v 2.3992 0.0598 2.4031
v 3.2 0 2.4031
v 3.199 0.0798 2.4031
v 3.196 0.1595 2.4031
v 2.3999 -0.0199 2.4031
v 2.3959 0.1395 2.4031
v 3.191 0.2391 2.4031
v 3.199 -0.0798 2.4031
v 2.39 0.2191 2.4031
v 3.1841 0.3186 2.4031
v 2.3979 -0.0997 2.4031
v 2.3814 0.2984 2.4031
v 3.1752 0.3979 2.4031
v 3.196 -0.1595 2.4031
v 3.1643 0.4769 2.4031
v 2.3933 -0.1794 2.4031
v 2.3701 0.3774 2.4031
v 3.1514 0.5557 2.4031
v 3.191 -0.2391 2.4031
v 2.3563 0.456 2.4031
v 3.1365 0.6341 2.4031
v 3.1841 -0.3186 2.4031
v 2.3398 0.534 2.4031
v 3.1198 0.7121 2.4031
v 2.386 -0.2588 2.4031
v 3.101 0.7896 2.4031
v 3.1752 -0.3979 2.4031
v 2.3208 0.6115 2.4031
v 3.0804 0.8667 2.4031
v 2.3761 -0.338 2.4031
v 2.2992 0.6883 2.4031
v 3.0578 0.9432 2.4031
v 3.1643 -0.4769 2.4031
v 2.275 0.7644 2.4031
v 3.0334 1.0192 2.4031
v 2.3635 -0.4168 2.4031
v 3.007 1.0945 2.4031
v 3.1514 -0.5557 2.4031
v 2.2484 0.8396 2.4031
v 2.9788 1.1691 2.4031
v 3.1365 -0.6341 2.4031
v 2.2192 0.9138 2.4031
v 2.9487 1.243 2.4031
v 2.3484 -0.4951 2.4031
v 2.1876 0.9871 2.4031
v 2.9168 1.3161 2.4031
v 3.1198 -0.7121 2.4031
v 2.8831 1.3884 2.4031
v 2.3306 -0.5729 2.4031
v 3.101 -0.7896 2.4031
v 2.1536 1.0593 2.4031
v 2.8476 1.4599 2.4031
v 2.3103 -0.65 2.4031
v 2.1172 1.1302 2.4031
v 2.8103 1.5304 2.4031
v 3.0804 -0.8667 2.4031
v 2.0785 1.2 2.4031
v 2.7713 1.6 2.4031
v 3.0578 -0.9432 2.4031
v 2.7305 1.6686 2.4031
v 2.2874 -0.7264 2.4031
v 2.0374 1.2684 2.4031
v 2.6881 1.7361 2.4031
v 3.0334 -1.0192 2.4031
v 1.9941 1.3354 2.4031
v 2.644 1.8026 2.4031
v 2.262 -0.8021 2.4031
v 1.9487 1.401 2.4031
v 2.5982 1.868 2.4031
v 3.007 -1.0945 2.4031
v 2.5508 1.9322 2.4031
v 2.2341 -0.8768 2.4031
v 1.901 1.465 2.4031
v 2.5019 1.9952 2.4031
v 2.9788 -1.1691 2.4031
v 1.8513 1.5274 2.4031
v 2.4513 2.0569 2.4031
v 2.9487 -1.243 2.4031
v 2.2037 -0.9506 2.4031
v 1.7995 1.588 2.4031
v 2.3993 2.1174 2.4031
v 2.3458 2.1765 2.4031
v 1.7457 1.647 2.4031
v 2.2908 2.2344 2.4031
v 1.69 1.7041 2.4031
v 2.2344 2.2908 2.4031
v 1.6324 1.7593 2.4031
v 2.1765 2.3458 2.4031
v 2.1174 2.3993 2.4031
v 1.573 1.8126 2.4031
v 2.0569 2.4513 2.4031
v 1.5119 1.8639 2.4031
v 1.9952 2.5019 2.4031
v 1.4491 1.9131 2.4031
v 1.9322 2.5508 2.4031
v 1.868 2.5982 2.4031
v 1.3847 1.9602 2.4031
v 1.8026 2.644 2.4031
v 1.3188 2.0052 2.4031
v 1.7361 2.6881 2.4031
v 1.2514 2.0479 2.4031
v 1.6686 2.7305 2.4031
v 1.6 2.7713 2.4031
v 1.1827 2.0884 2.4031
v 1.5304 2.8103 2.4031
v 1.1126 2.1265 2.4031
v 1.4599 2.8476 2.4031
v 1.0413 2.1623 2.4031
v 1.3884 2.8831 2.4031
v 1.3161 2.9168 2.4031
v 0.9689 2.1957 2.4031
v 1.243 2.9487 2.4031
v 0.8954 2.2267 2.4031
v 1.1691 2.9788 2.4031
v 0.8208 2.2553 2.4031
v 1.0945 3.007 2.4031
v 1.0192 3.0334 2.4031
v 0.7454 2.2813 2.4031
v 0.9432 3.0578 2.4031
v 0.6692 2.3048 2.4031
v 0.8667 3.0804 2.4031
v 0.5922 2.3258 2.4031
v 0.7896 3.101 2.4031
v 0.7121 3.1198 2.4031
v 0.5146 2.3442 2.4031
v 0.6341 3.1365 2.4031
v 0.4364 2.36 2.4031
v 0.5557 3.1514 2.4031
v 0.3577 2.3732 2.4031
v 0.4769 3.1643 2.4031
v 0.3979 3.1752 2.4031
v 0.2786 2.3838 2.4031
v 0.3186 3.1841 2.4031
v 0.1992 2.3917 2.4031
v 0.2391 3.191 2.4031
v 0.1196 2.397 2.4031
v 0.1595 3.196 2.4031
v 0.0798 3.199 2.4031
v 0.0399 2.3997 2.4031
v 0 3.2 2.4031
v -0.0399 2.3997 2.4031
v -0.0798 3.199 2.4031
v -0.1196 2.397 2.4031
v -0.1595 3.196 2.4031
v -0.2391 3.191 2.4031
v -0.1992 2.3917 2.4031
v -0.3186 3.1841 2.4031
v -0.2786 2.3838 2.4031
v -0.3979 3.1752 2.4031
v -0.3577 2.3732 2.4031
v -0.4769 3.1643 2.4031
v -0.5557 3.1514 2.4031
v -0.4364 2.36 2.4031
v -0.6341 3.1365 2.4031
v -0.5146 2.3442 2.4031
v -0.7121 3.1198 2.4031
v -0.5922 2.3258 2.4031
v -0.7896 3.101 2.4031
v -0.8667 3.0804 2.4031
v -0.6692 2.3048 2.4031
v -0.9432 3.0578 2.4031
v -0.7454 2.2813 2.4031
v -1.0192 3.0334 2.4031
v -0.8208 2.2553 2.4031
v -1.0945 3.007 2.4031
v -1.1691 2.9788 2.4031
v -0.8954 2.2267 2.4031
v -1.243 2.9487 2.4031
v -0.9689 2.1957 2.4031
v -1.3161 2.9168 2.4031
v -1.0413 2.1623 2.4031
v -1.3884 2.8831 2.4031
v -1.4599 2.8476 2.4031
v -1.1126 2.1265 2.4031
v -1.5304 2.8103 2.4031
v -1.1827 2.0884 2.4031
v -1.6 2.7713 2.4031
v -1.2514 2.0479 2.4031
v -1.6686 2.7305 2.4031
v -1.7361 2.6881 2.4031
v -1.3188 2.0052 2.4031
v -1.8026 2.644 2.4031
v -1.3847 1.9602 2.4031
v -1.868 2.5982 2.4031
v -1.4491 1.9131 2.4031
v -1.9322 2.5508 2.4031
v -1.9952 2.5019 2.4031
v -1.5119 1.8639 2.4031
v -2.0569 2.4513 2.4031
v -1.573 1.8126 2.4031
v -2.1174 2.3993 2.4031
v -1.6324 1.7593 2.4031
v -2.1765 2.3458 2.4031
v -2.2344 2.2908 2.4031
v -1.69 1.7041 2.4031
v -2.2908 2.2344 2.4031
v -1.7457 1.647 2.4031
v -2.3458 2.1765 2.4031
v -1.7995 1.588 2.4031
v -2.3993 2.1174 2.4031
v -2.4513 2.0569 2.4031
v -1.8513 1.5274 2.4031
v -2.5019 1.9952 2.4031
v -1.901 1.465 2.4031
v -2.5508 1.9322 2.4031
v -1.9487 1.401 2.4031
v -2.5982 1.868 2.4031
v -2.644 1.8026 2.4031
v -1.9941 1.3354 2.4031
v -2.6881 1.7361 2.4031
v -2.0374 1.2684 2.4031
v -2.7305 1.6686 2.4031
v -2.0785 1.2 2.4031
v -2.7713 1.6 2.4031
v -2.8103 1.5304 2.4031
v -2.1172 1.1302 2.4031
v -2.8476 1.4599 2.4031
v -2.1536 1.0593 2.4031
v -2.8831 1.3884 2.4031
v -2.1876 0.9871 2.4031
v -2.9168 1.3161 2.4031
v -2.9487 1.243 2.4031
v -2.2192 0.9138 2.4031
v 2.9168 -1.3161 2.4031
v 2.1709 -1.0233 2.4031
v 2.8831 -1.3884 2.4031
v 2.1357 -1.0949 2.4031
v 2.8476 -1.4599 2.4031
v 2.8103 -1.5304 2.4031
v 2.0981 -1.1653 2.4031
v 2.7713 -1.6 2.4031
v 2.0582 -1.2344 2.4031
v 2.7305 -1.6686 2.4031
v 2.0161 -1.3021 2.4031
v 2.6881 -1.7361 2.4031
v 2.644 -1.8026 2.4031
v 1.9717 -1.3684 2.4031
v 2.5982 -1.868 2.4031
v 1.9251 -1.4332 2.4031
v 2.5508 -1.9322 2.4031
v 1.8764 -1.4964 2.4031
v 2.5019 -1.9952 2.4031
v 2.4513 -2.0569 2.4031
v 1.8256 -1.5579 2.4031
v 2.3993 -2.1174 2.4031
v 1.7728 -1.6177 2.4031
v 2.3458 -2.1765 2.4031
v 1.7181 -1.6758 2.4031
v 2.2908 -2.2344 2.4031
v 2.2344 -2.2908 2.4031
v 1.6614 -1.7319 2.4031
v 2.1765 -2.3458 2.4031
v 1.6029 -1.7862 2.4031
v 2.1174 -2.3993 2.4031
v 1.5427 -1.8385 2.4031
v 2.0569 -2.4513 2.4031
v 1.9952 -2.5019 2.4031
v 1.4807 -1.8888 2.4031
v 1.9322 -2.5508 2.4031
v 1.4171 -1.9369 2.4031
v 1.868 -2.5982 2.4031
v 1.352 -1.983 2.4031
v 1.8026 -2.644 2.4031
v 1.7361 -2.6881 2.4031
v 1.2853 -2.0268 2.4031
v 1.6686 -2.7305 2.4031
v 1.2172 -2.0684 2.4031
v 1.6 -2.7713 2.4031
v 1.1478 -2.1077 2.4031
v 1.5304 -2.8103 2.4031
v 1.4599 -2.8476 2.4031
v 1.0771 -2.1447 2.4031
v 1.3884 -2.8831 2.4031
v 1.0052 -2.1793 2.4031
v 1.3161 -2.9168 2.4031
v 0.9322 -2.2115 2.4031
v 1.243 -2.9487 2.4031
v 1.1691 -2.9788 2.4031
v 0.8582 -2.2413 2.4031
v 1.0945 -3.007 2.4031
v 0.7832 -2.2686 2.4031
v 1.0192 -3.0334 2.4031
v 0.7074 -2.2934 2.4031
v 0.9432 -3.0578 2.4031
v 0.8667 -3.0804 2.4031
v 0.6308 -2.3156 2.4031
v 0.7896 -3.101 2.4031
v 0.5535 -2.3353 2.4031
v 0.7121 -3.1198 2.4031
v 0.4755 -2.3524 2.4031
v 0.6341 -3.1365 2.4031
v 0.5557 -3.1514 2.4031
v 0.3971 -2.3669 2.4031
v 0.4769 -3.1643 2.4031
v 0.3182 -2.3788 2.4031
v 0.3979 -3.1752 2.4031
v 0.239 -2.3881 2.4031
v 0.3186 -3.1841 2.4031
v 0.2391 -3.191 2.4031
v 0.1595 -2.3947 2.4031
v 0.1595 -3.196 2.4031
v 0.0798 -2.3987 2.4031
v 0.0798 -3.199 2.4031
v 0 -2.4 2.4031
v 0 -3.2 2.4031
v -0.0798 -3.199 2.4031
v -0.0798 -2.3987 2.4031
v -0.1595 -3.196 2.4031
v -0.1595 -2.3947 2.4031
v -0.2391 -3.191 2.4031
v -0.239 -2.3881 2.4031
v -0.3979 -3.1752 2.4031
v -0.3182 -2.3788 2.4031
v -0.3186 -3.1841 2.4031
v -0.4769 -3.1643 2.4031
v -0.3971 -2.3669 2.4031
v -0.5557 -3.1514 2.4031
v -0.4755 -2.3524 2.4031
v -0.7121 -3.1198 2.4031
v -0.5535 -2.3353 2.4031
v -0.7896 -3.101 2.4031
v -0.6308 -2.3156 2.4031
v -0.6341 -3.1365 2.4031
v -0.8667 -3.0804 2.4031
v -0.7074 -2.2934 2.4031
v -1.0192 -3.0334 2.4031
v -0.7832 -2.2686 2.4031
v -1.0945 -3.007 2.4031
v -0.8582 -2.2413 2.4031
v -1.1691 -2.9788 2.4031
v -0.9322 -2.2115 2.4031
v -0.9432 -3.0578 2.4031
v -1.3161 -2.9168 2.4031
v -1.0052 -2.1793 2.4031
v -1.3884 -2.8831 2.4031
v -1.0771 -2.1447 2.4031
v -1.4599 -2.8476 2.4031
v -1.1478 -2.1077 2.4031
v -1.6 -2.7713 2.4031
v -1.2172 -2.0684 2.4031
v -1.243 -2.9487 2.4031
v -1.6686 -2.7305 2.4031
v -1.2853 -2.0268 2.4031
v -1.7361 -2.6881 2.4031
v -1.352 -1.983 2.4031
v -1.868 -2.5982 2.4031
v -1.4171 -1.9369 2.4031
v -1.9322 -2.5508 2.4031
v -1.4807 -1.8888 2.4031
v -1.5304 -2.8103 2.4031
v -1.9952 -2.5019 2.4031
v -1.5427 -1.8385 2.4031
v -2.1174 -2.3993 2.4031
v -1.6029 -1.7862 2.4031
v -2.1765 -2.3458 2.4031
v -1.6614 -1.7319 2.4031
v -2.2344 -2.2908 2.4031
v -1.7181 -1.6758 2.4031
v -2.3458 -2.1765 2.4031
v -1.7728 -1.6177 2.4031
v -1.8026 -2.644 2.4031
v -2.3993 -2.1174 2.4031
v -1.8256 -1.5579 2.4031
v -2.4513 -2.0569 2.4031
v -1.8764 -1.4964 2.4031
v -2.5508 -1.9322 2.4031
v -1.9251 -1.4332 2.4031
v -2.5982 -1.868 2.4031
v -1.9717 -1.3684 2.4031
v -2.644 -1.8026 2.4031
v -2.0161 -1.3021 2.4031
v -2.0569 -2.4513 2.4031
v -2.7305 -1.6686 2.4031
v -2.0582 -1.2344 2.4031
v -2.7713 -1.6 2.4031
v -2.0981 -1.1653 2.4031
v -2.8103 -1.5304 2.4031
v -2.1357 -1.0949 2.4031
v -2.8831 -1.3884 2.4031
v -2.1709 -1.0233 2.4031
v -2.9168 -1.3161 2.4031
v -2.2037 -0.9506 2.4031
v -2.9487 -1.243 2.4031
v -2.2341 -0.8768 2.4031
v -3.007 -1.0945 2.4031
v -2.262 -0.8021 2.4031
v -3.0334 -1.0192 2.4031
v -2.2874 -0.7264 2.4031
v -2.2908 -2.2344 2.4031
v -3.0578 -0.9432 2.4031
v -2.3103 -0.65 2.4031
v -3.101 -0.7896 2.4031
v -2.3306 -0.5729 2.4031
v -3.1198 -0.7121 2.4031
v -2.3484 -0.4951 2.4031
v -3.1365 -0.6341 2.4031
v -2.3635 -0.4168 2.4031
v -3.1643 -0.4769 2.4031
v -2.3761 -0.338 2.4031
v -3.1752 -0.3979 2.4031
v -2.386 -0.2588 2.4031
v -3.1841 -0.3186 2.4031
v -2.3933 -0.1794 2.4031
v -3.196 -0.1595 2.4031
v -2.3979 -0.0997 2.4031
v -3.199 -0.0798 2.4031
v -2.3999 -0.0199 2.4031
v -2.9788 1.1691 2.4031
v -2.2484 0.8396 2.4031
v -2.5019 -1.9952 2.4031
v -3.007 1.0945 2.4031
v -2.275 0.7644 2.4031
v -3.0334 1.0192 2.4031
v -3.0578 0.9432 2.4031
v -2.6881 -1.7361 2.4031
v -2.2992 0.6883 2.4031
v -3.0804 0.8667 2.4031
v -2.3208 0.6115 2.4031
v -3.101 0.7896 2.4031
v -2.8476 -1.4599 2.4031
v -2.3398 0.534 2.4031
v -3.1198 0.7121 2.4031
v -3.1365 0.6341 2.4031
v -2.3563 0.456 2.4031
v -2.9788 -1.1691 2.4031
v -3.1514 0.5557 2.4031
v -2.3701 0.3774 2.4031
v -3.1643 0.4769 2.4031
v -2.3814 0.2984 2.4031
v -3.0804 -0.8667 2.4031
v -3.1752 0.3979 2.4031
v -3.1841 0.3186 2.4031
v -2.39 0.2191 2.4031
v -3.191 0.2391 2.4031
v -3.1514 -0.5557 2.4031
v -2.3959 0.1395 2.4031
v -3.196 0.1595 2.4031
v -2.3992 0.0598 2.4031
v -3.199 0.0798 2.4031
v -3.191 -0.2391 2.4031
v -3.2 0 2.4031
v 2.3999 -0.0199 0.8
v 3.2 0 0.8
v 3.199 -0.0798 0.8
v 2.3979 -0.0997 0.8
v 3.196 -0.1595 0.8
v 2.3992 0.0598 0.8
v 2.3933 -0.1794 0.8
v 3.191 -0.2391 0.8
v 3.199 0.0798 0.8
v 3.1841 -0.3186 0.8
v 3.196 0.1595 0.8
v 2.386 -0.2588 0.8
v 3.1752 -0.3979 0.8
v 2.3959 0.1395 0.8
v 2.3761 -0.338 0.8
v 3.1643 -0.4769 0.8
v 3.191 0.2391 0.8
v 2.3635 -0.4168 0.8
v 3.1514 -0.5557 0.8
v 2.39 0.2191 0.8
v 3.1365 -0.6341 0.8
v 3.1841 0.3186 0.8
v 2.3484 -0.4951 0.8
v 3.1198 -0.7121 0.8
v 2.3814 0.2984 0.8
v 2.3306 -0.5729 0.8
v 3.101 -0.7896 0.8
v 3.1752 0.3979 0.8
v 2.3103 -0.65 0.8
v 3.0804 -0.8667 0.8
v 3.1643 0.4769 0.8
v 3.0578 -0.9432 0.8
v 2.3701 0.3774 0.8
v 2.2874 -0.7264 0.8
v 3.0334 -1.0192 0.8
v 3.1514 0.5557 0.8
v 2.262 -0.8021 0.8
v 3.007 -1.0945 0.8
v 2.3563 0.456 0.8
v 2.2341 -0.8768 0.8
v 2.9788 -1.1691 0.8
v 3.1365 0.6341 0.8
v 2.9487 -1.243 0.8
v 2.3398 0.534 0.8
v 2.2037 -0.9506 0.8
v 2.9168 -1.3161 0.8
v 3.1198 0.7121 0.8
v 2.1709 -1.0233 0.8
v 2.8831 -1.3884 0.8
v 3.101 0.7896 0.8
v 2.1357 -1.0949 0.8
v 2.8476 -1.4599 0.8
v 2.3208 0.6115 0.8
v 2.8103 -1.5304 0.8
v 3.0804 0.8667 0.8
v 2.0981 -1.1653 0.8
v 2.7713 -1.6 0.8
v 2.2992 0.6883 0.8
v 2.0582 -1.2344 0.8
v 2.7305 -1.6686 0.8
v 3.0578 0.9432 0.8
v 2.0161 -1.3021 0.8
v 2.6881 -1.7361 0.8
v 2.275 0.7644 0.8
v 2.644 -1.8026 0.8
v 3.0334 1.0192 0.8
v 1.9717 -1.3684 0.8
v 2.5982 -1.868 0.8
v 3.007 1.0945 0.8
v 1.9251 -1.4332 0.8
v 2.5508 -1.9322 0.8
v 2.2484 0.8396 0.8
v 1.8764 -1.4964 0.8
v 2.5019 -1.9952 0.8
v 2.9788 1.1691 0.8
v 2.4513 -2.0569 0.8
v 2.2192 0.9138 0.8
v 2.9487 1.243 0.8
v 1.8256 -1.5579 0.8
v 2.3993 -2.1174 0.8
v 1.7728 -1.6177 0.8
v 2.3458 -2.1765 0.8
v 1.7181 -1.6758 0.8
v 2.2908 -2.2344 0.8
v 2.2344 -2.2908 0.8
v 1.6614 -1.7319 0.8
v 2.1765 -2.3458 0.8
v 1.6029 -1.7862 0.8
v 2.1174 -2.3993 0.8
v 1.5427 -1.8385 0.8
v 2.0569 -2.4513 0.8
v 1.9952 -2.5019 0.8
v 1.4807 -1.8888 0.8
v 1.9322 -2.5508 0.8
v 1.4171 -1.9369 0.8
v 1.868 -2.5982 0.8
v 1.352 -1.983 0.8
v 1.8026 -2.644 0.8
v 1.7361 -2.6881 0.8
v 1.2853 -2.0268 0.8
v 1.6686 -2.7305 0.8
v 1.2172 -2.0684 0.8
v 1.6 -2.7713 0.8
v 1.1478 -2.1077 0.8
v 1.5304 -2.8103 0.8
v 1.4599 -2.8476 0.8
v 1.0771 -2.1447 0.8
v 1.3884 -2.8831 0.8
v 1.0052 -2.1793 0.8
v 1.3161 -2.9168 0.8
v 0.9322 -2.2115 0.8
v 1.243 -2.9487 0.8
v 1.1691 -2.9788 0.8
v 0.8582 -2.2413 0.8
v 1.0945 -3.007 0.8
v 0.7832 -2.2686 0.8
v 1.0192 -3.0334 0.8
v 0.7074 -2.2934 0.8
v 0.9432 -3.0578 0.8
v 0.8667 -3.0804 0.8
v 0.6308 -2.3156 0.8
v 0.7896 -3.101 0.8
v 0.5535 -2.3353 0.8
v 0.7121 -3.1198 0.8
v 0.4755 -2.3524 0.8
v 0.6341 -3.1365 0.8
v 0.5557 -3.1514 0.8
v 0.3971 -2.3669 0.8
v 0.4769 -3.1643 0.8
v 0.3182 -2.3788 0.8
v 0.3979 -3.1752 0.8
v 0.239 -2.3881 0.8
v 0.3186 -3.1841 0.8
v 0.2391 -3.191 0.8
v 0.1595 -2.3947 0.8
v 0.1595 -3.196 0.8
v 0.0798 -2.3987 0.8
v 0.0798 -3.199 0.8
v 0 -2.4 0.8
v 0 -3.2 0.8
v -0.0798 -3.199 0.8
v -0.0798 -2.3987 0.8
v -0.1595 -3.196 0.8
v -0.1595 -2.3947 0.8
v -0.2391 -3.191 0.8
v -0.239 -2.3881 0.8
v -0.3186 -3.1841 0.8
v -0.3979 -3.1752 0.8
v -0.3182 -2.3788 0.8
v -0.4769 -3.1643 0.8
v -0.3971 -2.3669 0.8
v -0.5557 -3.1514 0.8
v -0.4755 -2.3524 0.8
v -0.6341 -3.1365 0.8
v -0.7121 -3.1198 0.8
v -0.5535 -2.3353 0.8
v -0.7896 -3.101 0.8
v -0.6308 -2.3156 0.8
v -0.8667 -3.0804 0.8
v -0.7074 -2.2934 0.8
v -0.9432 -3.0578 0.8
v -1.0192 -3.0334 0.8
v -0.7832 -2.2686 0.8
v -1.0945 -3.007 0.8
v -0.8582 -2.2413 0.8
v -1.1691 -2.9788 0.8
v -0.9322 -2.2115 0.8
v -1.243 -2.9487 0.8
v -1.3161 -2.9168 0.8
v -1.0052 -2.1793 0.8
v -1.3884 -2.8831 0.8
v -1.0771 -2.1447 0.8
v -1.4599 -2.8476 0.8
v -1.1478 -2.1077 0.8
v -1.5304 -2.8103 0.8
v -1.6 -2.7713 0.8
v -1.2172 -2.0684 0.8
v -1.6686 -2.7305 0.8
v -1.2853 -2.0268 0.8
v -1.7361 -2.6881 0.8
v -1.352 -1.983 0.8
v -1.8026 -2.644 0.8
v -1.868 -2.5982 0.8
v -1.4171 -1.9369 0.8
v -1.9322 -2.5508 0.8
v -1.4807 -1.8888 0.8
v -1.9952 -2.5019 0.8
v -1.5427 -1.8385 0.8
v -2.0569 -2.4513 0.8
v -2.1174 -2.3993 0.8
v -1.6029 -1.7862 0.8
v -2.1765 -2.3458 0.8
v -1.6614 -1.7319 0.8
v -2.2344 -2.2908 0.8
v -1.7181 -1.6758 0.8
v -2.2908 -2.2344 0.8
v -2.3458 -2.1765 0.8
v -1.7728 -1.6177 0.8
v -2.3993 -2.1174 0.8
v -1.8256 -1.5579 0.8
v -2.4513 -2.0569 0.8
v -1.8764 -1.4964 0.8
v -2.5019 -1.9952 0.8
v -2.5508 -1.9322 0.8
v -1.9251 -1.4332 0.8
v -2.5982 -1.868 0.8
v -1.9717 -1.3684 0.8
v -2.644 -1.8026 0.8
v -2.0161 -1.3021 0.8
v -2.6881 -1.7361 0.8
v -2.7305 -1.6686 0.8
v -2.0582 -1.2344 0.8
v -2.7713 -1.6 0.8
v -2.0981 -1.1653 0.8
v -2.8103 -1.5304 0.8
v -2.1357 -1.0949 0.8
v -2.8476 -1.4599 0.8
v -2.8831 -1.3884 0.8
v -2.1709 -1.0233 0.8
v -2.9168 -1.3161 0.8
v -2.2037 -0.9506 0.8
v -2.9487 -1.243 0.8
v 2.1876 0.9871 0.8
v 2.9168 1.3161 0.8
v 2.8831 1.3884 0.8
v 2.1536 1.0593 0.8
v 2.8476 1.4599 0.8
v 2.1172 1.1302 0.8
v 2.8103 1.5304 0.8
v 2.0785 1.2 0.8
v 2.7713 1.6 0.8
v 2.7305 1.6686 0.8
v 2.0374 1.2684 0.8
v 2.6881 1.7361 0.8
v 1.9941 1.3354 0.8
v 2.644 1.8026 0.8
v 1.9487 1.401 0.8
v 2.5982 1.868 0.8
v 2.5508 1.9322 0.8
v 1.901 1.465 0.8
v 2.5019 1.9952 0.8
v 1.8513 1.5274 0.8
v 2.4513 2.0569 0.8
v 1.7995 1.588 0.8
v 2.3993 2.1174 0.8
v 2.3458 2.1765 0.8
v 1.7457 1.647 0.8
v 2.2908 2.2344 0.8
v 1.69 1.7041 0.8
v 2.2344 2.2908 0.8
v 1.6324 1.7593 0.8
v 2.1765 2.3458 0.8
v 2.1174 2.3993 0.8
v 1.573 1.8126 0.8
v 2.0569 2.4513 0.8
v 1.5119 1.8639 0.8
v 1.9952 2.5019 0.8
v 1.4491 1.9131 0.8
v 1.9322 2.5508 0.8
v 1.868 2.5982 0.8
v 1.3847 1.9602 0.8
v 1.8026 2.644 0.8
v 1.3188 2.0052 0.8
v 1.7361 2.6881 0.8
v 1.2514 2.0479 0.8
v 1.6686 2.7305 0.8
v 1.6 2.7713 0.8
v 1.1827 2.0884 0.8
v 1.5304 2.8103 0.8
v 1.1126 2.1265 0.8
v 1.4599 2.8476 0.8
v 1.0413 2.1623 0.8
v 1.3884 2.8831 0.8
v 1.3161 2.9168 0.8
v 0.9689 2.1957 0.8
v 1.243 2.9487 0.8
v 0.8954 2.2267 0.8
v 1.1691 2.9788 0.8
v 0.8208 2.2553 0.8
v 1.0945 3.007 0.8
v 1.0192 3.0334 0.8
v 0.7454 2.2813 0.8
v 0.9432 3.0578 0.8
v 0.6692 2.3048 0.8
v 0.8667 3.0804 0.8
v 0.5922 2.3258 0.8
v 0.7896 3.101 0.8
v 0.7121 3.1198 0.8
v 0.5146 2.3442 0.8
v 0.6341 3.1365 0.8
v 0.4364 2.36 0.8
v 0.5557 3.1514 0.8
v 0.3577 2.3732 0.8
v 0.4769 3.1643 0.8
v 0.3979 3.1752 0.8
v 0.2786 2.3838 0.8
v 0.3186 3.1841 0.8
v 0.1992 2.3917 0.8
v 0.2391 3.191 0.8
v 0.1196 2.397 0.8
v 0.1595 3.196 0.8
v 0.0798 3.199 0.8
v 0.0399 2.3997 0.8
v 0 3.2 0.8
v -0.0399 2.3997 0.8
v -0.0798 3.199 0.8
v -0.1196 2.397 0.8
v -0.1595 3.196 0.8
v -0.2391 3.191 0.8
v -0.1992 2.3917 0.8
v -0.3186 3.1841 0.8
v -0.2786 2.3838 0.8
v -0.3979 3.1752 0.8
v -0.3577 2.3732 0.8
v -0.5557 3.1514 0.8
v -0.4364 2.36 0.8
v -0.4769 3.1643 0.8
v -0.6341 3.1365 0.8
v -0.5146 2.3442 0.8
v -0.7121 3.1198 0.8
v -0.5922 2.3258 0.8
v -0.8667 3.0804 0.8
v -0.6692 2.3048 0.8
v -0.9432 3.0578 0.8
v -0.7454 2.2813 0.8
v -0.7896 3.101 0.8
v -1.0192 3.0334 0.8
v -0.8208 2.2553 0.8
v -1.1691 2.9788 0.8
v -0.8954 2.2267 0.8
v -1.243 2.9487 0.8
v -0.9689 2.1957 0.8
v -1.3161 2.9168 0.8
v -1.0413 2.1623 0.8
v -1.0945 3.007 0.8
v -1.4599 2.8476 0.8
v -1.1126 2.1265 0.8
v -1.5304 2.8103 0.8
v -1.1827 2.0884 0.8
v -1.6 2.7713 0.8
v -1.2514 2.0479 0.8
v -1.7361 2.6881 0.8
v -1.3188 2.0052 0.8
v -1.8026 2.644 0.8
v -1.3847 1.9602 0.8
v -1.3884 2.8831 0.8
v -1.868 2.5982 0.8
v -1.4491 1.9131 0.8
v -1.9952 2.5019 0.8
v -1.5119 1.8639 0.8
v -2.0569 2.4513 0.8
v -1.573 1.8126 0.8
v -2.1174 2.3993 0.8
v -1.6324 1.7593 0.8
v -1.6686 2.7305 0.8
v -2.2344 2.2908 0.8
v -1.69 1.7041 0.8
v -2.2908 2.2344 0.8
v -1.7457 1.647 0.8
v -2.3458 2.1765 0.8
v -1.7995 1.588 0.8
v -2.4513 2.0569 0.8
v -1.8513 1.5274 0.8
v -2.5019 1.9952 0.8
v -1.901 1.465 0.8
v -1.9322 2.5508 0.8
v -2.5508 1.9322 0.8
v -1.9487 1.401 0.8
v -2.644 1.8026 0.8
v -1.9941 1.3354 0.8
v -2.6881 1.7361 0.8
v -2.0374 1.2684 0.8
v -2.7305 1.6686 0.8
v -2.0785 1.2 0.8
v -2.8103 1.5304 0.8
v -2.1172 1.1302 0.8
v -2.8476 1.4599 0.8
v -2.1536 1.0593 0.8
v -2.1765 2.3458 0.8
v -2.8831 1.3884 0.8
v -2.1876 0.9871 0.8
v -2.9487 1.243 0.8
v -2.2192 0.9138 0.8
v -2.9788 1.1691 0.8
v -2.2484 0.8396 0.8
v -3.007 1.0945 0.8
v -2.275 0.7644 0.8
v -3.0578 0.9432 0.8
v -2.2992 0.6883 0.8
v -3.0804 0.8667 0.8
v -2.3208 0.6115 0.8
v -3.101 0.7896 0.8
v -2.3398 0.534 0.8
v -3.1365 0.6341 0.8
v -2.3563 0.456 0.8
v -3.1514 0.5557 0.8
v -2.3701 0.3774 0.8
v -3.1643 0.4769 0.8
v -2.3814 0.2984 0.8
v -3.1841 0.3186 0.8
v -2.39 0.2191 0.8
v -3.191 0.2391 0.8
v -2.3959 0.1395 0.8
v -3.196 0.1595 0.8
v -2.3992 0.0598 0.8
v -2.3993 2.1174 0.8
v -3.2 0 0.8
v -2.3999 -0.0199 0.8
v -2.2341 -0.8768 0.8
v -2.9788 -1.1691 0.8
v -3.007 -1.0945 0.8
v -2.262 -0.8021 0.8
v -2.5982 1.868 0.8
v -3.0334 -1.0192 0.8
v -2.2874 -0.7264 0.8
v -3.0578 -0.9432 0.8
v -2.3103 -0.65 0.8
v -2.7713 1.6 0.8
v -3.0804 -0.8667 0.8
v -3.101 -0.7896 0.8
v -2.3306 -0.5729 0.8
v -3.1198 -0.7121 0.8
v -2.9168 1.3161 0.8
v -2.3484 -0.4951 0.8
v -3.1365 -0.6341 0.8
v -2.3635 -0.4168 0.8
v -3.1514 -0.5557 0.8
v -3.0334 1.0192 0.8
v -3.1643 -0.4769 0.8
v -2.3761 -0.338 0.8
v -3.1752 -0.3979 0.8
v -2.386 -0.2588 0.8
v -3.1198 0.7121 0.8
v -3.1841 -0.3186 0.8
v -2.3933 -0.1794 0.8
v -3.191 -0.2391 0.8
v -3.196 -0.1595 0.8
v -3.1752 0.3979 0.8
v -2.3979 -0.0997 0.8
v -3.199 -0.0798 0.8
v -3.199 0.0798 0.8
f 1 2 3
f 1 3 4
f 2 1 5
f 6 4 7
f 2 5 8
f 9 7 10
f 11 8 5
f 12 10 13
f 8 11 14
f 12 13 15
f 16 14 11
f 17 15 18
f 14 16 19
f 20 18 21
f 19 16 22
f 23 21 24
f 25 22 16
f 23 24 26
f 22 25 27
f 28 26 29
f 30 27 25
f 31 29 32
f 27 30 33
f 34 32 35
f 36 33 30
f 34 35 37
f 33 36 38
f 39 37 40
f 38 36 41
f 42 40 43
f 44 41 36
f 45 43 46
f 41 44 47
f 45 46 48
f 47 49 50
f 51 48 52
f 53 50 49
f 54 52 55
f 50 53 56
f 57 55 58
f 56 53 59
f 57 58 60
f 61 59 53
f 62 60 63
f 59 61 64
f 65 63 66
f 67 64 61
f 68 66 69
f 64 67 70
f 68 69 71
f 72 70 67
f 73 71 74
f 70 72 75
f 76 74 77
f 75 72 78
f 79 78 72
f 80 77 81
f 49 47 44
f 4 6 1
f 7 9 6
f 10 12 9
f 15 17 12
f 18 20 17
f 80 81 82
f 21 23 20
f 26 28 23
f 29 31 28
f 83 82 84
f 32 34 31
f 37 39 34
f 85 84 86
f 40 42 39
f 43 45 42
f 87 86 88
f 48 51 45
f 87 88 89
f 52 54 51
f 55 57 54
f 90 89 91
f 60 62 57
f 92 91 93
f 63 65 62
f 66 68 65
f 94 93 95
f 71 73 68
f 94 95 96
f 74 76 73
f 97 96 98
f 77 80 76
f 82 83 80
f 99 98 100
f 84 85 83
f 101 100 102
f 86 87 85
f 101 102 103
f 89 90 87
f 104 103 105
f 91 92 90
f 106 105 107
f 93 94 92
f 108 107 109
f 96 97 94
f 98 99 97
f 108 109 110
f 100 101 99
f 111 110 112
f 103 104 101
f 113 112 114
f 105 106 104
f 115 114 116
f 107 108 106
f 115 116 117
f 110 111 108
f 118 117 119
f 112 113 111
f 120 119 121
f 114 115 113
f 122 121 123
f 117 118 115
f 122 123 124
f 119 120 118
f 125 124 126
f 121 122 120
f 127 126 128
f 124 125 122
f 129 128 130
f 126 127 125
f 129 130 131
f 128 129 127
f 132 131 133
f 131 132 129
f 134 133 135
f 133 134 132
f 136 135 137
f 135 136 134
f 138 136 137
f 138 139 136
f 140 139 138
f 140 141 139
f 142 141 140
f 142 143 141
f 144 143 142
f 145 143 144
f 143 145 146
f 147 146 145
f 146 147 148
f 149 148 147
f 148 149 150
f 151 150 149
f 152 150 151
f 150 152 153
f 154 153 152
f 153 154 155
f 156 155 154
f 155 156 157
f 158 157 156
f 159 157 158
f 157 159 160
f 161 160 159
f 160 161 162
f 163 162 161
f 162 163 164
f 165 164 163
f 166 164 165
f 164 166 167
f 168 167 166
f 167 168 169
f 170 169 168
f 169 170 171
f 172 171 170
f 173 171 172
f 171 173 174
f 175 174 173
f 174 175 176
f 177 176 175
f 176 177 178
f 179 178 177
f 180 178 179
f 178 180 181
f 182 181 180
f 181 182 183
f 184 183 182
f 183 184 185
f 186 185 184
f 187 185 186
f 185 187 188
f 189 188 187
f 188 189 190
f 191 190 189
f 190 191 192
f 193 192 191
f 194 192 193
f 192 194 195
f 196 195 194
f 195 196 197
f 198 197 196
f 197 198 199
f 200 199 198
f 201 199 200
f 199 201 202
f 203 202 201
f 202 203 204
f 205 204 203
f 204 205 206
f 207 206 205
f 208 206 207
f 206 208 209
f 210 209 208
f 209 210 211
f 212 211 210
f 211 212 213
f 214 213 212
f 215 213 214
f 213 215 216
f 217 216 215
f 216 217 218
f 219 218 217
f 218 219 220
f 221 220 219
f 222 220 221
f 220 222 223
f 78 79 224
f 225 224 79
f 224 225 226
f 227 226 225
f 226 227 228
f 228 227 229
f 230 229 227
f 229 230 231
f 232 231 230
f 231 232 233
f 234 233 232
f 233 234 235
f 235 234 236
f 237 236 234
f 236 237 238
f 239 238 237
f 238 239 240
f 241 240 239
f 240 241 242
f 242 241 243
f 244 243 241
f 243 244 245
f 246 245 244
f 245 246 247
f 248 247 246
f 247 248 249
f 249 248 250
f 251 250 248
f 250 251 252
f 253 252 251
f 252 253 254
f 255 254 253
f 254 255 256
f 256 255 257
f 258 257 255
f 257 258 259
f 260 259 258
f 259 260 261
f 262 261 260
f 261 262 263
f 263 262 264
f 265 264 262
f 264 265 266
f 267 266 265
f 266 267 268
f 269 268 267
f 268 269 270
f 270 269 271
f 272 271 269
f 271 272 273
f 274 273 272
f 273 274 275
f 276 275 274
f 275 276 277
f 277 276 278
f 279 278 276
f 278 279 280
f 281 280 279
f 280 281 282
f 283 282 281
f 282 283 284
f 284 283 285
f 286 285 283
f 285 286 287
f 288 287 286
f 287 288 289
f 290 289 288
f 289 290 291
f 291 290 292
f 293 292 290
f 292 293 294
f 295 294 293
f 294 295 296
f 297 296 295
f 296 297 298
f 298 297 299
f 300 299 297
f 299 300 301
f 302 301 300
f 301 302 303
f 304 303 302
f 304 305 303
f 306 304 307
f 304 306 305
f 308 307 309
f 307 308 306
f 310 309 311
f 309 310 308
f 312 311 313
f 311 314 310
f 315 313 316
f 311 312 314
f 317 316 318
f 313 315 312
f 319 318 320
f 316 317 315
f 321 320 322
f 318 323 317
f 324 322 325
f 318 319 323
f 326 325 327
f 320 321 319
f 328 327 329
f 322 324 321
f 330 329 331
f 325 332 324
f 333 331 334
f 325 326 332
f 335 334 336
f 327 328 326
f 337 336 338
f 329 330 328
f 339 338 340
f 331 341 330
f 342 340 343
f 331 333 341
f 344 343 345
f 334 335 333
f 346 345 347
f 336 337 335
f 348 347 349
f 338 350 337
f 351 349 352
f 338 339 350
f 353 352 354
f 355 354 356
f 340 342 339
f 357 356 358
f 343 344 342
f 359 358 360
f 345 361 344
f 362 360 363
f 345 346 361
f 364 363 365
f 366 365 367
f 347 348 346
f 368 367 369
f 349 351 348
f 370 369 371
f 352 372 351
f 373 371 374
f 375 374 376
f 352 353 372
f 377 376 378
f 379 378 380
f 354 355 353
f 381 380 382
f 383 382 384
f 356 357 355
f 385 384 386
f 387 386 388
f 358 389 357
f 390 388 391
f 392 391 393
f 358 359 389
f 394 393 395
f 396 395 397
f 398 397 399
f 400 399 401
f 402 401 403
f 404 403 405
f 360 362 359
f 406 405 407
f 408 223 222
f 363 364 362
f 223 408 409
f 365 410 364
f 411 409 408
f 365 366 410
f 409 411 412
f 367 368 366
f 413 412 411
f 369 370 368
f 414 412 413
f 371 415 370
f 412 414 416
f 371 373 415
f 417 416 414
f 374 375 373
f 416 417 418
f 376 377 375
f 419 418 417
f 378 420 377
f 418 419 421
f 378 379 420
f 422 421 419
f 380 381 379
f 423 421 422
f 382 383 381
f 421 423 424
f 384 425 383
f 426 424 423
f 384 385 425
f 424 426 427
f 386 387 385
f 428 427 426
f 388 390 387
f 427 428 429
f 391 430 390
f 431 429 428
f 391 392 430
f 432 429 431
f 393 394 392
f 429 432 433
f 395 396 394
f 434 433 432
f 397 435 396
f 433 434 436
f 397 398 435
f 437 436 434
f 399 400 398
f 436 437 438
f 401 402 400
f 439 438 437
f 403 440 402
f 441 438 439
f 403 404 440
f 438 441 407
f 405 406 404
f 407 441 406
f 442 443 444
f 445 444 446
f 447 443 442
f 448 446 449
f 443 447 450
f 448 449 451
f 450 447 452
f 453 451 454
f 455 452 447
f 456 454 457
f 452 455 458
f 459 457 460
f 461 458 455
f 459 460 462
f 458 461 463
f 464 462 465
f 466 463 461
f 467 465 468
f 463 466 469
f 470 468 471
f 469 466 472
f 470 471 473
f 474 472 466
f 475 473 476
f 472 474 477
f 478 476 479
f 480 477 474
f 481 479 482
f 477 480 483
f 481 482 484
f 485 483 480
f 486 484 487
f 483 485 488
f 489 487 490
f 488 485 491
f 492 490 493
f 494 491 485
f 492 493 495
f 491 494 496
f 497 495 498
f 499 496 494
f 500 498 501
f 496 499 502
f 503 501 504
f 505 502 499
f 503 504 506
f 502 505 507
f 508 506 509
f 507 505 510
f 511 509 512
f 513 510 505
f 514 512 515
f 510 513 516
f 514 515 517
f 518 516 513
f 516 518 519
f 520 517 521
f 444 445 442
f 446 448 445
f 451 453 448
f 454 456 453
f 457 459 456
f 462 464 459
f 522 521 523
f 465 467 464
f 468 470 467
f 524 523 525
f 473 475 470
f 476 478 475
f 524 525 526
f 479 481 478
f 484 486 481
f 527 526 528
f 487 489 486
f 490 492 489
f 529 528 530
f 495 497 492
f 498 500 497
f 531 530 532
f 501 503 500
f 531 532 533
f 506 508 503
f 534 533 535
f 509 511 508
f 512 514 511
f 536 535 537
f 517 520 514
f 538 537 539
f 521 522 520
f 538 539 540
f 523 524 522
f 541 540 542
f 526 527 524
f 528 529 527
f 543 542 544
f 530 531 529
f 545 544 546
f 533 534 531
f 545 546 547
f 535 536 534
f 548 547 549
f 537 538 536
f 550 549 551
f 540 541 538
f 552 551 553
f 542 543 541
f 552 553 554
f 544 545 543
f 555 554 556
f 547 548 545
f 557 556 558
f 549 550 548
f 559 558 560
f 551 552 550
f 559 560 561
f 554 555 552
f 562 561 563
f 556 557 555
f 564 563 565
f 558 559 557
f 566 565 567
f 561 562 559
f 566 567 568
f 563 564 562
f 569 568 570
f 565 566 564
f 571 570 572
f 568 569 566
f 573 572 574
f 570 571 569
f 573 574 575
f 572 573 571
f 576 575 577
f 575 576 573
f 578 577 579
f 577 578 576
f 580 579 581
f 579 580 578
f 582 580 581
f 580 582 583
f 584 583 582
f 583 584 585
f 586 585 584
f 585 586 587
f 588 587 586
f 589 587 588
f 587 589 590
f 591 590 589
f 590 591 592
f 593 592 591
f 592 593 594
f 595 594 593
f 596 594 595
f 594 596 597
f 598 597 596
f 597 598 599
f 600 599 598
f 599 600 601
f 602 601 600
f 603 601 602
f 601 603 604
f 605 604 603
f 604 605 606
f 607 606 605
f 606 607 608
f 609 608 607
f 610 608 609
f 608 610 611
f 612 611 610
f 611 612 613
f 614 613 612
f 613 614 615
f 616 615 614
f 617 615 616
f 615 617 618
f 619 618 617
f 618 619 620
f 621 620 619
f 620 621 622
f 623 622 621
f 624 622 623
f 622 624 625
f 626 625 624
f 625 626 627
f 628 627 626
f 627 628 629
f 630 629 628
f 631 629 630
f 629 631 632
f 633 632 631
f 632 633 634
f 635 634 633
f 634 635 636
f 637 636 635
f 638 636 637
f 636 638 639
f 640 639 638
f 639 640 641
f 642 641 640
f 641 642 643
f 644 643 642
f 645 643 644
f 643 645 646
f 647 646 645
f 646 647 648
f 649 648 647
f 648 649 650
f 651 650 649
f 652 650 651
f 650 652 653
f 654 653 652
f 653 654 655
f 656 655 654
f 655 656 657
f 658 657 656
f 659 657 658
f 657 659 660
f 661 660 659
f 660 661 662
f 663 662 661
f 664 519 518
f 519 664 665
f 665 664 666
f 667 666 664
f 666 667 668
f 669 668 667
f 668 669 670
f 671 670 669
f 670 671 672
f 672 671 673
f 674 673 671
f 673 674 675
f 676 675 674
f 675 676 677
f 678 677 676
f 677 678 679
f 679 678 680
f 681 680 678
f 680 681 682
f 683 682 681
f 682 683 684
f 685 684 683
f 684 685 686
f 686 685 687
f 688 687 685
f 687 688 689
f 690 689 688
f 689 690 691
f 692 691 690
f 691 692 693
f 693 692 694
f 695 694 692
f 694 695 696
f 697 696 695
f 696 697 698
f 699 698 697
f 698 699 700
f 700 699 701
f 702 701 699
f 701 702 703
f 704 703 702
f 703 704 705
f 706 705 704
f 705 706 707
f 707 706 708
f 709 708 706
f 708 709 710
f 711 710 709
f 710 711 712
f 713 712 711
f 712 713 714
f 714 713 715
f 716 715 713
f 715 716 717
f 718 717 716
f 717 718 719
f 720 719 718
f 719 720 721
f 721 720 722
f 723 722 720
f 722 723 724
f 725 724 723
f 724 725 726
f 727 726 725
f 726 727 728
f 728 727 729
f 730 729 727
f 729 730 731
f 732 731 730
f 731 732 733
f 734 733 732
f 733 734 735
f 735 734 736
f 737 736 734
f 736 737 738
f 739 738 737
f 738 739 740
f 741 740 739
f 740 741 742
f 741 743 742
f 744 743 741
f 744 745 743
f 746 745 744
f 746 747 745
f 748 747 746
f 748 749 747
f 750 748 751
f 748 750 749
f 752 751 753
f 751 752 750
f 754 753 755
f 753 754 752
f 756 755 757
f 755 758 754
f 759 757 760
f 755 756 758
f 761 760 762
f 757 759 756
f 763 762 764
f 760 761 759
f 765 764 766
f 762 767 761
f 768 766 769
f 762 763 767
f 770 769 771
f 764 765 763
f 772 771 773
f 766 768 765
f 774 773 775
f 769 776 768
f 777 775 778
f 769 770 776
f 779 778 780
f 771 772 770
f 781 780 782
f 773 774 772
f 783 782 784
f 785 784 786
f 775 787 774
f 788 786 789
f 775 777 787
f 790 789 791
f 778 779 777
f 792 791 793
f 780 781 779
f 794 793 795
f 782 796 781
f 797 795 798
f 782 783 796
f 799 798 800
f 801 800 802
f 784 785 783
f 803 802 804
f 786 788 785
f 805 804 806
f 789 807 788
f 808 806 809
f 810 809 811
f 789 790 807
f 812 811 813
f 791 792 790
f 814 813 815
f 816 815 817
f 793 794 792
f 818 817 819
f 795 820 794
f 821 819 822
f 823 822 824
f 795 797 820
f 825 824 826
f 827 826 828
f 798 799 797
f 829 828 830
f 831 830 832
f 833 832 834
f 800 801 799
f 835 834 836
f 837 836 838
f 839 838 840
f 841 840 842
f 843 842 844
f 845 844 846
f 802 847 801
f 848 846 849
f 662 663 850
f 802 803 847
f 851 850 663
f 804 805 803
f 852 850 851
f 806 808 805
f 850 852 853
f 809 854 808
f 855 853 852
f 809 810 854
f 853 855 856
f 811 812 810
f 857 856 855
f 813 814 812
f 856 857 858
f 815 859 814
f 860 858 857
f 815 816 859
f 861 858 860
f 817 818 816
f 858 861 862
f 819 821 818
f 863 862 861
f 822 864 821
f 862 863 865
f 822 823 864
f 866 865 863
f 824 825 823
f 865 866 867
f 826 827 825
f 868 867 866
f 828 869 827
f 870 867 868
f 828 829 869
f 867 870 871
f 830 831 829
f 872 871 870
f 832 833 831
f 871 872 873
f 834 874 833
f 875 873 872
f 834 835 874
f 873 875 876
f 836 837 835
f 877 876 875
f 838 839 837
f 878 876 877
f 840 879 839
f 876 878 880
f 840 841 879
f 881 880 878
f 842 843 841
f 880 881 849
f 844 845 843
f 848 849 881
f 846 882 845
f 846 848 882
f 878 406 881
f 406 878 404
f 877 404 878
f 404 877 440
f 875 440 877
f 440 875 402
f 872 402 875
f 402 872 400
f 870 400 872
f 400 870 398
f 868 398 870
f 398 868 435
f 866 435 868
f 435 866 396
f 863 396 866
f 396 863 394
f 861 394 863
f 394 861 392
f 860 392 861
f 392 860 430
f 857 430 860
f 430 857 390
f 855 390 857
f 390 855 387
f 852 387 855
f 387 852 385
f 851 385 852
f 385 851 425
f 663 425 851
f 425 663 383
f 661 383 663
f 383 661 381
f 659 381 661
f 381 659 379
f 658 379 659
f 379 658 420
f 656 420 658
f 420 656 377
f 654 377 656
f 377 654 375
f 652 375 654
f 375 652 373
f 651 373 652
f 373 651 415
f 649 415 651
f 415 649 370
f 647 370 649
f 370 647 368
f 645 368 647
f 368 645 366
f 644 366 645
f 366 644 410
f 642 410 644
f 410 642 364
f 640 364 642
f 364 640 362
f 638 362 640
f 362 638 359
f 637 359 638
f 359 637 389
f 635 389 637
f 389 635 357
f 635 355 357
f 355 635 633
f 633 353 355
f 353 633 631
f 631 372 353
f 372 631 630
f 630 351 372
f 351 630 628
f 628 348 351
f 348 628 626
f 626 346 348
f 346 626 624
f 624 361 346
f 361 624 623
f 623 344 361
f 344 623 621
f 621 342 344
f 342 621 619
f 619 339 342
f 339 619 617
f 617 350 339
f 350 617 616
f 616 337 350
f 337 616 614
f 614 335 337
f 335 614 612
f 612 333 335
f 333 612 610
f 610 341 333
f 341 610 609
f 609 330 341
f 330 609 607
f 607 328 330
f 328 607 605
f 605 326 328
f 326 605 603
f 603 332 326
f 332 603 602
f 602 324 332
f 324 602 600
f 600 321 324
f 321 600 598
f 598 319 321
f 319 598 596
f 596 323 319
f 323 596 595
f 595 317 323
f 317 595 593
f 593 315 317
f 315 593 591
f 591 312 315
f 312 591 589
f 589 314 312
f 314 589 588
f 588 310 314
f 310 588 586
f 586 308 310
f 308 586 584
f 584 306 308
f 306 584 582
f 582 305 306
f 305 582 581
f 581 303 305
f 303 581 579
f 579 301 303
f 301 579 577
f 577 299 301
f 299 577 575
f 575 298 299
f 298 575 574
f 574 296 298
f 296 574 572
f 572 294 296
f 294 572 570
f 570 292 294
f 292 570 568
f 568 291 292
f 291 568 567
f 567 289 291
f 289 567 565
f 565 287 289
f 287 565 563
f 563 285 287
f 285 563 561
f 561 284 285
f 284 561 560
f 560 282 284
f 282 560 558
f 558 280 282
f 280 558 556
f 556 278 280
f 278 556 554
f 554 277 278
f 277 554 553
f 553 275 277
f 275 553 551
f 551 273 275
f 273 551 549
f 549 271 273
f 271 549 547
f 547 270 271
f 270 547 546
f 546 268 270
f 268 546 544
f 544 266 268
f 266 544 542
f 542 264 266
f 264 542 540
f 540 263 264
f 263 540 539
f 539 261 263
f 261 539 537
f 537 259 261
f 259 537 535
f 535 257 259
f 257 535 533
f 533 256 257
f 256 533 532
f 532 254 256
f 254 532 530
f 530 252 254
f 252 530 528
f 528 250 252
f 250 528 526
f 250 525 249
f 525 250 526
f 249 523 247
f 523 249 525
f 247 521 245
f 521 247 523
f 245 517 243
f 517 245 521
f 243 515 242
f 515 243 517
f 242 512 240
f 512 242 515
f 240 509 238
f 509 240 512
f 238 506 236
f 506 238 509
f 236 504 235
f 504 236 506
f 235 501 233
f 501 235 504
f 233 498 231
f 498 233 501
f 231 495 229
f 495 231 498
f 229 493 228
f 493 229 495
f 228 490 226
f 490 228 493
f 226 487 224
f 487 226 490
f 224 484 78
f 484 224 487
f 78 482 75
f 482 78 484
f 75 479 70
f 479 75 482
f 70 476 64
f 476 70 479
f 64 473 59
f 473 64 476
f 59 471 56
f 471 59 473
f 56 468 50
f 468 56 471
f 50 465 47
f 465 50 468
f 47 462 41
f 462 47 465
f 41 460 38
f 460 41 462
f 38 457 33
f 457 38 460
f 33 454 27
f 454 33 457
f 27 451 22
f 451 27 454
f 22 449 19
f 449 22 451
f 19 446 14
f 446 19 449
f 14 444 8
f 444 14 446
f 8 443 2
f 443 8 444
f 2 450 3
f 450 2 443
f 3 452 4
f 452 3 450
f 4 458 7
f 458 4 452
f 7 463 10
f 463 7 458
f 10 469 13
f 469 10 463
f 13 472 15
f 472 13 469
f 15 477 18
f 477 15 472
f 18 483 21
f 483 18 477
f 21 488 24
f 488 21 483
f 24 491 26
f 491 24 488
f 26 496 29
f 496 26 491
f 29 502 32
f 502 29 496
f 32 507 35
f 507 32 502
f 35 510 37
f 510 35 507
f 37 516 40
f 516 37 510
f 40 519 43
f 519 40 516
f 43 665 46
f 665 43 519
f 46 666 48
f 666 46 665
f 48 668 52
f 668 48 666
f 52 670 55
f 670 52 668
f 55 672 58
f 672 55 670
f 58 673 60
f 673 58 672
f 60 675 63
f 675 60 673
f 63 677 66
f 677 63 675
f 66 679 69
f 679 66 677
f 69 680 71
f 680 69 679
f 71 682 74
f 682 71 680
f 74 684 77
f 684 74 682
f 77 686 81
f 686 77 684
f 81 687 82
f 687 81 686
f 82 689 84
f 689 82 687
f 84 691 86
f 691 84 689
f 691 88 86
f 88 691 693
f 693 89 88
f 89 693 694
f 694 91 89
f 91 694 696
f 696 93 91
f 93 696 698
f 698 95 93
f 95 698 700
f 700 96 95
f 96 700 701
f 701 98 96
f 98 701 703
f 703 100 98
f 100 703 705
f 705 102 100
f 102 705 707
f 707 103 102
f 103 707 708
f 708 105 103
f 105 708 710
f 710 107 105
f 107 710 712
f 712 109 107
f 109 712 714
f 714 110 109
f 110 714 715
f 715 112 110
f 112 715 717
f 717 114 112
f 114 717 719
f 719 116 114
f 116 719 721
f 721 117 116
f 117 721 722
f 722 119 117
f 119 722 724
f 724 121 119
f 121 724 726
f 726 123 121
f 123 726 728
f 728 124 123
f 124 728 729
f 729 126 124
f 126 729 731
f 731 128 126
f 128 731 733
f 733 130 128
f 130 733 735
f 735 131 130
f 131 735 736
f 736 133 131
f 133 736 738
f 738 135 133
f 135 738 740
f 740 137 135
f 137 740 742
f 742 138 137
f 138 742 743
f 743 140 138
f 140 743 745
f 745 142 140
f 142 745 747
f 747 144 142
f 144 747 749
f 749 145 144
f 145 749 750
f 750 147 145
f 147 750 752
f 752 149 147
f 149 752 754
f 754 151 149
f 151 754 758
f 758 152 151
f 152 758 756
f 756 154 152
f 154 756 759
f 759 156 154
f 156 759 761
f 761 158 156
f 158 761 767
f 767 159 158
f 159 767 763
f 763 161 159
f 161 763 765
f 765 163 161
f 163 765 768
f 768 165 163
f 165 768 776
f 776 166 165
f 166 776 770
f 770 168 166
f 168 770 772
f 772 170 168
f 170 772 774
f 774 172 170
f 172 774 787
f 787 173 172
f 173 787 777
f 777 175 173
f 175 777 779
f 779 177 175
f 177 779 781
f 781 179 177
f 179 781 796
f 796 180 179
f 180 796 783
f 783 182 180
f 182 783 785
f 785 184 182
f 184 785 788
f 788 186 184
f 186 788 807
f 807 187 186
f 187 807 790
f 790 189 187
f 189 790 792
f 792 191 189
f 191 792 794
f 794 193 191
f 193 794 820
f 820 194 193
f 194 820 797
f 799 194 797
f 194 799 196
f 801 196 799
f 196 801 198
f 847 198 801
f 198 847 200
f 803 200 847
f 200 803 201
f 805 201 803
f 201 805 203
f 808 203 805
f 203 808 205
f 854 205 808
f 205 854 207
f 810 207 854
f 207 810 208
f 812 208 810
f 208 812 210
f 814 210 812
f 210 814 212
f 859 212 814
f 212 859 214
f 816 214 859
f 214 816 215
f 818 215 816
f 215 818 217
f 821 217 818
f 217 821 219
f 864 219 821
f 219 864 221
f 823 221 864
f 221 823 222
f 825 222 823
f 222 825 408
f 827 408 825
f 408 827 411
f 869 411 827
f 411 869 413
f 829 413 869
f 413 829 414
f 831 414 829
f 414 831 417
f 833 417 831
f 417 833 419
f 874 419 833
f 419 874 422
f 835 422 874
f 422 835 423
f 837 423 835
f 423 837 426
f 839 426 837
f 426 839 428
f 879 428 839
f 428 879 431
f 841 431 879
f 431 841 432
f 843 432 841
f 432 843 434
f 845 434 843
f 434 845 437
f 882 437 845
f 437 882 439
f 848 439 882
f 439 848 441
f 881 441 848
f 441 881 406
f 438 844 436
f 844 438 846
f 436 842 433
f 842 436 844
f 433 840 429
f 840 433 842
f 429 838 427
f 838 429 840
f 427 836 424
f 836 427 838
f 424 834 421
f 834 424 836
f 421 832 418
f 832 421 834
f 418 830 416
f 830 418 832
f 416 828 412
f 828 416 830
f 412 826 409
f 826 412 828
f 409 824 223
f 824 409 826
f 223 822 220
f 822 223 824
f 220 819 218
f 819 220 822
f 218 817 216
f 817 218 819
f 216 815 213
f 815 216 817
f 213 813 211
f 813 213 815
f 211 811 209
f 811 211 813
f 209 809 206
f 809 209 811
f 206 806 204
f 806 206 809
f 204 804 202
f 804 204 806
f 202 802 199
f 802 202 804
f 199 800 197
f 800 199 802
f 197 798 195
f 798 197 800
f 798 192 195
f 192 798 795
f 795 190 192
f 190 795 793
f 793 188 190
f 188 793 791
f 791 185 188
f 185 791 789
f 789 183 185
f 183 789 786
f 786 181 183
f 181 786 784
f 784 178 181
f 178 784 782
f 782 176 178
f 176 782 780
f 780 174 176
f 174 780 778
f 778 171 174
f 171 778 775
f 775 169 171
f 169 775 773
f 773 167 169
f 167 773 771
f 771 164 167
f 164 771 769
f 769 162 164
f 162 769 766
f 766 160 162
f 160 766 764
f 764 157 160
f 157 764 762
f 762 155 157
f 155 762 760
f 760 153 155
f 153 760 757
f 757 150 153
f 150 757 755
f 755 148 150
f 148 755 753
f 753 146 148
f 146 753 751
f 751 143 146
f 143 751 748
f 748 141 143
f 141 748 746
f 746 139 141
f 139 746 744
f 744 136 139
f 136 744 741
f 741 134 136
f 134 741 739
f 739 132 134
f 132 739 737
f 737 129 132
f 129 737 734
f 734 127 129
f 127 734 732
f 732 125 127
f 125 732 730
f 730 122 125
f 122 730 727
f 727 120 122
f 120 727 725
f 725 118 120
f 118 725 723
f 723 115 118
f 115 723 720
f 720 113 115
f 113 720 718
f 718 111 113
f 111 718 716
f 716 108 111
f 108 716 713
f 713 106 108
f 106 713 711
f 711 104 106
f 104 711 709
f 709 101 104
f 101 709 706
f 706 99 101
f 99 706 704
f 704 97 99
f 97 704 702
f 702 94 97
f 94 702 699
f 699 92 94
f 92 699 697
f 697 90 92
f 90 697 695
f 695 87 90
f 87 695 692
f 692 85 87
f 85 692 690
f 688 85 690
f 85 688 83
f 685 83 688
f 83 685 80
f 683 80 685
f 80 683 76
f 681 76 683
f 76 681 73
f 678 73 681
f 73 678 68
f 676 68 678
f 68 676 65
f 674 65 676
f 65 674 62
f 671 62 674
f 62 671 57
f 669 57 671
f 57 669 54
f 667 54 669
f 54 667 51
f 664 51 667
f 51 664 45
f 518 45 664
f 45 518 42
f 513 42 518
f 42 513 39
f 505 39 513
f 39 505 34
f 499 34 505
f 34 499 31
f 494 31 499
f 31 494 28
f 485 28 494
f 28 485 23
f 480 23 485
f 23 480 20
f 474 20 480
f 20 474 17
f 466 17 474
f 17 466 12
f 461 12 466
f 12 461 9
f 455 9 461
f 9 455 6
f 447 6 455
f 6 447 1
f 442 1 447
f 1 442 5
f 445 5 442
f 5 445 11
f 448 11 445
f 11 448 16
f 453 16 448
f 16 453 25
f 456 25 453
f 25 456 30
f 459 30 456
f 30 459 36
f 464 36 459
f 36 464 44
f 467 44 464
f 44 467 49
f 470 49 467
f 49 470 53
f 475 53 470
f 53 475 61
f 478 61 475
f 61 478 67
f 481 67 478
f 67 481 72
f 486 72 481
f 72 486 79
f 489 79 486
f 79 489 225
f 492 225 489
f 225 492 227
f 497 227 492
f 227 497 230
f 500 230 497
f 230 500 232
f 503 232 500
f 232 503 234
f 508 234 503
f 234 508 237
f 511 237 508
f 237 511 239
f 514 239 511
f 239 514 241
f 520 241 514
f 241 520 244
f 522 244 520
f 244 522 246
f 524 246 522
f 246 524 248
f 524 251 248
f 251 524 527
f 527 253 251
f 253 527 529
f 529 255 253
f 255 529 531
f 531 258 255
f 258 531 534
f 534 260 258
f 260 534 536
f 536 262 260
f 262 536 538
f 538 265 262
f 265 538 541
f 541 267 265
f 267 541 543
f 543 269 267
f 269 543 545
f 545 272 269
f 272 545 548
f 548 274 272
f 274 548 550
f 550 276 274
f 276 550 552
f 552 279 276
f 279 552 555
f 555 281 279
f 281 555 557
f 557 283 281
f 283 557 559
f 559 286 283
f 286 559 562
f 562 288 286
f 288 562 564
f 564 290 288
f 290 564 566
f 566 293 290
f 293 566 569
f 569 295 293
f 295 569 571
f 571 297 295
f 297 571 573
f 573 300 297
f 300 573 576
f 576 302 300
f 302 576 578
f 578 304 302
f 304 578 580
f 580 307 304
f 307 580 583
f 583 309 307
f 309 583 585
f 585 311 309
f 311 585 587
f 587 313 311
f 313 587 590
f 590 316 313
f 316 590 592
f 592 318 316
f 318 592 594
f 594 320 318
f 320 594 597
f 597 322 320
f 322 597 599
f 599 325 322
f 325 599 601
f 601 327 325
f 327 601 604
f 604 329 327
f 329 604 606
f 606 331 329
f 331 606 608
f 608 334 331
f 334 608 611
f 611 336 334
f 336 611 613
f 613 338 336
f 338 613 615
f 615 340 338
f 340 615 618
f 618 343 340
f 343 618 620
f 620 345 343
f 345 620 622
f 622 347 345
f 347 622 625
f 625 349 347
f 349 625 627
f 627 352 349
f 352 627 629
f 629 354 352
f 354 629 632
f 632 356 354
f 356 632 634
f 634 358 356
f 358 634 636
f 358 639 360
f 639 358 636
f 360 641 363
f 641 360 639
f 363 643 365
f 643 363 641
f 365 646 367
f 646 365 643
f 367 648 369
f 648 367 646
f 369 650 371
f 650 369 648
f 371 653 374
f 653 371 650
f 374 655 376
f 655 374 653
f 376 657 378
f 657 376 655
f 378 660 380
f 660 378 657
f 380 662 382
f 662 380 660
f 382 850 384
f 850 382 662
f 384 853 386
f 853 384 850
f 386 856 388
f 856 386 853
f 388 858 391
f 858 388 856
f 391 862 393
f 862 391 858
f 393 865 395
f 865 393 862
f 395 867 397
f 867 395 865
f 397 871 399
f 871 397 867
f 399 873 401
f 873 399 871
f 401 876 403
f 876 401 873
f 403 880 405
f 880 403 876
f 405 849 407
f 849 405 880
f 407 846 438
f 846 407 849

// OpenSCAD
use <../lib.scad>
use <../p/2-4chrd.scad>
use <s/u454s01.scad>
$fa=1; $fs=0.2;
function ldraw_lib__u454(realsolid=false) = [
// 0 Signpost Slanted Cantilever with Suspended Sign
// 0 Name: u454.dat
// 0 Author: Takeshi Takahashi [RainbowDolphin]
// 0 !LDRAW_ORG Part UPDATE 2022-02
// 0 !LICENSE Licensed under CC BY 2.0 and CC BY 4.0 : see CAreadme.txt
// 
// 0 BFC CERTIFY CCW
  [0,"BFC","CERTIFY"],
  [0,"BFC","CCW"],
// 
// 0 !CATEGORY Roadsign
// 
// 0 !HISTORY 2021-01-03 [RainbowDolphin] Created based on 764 by Chris Dee [cwdee]
// 0 !HISTORY 2022-03-06 [PTadmin] Official Update 2022-02
// 
// 
// 1 16 0 0 0 1 0 0 0 1 0 0 0 1 s\u454s01.dat
  [1,16,0,0,0,1,0,0,0,1,0,0,0,1, ldraw_lib__s__u454s01(realsolid)],
// 0 // potentially decorated surfaces
// 4 16 1 -131 -26 1 -159 -26 1 -159 -62 1 -131 -62
  [4,16,1,-131,-26,1,-159,-26,1,-159,-62,1,-131,-62],
// 4 16 -1 -131 -62 -1 -159 -62 -1 -159 -26 -1 -131 -26
  [4,16,-1,-131,-62,-1,-159,-62,-1,-159,-26,-1,-131,-26],
// 1 16 -1 -159 -44 0 1 0 0 0 -3 -18 0 0 2-4chrd.dat
  [1,16,-1,-159,-44,0,1,0,0,0,-3,-18,0,0, ldraw_lib__2_4chrd(realsolid)],
// 1 16 1 -159 -44 0 -1 0 0 0 -3 -18 0 0 2-4chrd.dat
  [1,16,1,-159,-44,0,-1,0,0,0,-3,-18,0,0, ldraw_lib__2_4chrd(realsolid)],
// 1 16 -1 -131 -44 0 1 0 0 0 3 18 0 0 2-4chrd.dat
  [1,16,-1,-131,-44,0,1,0,0,0,3,18,0,0, ldraw_lib__2_4chrd(realsolid)],
// 1 16 1 -131 -44 0 -1 0 0 0 3 18 0 0 2-4chrd.dat
  [1,16,1,-131,-44,0,-1,0,0,0,3,18,0,0, ldraw_lib__2_4chrd(realsolid)],
];
module ldraw_lib__u454(step=0, col=false, unit=2/5, alt=false, line=0.2, solid=!$preview)
    makepoly(ldraw_lib__u454(solid), step=step, col=col, unit=unit, alt=alt, line=line, solid=solid);
ldraw_lib__u454(line=0.2);
